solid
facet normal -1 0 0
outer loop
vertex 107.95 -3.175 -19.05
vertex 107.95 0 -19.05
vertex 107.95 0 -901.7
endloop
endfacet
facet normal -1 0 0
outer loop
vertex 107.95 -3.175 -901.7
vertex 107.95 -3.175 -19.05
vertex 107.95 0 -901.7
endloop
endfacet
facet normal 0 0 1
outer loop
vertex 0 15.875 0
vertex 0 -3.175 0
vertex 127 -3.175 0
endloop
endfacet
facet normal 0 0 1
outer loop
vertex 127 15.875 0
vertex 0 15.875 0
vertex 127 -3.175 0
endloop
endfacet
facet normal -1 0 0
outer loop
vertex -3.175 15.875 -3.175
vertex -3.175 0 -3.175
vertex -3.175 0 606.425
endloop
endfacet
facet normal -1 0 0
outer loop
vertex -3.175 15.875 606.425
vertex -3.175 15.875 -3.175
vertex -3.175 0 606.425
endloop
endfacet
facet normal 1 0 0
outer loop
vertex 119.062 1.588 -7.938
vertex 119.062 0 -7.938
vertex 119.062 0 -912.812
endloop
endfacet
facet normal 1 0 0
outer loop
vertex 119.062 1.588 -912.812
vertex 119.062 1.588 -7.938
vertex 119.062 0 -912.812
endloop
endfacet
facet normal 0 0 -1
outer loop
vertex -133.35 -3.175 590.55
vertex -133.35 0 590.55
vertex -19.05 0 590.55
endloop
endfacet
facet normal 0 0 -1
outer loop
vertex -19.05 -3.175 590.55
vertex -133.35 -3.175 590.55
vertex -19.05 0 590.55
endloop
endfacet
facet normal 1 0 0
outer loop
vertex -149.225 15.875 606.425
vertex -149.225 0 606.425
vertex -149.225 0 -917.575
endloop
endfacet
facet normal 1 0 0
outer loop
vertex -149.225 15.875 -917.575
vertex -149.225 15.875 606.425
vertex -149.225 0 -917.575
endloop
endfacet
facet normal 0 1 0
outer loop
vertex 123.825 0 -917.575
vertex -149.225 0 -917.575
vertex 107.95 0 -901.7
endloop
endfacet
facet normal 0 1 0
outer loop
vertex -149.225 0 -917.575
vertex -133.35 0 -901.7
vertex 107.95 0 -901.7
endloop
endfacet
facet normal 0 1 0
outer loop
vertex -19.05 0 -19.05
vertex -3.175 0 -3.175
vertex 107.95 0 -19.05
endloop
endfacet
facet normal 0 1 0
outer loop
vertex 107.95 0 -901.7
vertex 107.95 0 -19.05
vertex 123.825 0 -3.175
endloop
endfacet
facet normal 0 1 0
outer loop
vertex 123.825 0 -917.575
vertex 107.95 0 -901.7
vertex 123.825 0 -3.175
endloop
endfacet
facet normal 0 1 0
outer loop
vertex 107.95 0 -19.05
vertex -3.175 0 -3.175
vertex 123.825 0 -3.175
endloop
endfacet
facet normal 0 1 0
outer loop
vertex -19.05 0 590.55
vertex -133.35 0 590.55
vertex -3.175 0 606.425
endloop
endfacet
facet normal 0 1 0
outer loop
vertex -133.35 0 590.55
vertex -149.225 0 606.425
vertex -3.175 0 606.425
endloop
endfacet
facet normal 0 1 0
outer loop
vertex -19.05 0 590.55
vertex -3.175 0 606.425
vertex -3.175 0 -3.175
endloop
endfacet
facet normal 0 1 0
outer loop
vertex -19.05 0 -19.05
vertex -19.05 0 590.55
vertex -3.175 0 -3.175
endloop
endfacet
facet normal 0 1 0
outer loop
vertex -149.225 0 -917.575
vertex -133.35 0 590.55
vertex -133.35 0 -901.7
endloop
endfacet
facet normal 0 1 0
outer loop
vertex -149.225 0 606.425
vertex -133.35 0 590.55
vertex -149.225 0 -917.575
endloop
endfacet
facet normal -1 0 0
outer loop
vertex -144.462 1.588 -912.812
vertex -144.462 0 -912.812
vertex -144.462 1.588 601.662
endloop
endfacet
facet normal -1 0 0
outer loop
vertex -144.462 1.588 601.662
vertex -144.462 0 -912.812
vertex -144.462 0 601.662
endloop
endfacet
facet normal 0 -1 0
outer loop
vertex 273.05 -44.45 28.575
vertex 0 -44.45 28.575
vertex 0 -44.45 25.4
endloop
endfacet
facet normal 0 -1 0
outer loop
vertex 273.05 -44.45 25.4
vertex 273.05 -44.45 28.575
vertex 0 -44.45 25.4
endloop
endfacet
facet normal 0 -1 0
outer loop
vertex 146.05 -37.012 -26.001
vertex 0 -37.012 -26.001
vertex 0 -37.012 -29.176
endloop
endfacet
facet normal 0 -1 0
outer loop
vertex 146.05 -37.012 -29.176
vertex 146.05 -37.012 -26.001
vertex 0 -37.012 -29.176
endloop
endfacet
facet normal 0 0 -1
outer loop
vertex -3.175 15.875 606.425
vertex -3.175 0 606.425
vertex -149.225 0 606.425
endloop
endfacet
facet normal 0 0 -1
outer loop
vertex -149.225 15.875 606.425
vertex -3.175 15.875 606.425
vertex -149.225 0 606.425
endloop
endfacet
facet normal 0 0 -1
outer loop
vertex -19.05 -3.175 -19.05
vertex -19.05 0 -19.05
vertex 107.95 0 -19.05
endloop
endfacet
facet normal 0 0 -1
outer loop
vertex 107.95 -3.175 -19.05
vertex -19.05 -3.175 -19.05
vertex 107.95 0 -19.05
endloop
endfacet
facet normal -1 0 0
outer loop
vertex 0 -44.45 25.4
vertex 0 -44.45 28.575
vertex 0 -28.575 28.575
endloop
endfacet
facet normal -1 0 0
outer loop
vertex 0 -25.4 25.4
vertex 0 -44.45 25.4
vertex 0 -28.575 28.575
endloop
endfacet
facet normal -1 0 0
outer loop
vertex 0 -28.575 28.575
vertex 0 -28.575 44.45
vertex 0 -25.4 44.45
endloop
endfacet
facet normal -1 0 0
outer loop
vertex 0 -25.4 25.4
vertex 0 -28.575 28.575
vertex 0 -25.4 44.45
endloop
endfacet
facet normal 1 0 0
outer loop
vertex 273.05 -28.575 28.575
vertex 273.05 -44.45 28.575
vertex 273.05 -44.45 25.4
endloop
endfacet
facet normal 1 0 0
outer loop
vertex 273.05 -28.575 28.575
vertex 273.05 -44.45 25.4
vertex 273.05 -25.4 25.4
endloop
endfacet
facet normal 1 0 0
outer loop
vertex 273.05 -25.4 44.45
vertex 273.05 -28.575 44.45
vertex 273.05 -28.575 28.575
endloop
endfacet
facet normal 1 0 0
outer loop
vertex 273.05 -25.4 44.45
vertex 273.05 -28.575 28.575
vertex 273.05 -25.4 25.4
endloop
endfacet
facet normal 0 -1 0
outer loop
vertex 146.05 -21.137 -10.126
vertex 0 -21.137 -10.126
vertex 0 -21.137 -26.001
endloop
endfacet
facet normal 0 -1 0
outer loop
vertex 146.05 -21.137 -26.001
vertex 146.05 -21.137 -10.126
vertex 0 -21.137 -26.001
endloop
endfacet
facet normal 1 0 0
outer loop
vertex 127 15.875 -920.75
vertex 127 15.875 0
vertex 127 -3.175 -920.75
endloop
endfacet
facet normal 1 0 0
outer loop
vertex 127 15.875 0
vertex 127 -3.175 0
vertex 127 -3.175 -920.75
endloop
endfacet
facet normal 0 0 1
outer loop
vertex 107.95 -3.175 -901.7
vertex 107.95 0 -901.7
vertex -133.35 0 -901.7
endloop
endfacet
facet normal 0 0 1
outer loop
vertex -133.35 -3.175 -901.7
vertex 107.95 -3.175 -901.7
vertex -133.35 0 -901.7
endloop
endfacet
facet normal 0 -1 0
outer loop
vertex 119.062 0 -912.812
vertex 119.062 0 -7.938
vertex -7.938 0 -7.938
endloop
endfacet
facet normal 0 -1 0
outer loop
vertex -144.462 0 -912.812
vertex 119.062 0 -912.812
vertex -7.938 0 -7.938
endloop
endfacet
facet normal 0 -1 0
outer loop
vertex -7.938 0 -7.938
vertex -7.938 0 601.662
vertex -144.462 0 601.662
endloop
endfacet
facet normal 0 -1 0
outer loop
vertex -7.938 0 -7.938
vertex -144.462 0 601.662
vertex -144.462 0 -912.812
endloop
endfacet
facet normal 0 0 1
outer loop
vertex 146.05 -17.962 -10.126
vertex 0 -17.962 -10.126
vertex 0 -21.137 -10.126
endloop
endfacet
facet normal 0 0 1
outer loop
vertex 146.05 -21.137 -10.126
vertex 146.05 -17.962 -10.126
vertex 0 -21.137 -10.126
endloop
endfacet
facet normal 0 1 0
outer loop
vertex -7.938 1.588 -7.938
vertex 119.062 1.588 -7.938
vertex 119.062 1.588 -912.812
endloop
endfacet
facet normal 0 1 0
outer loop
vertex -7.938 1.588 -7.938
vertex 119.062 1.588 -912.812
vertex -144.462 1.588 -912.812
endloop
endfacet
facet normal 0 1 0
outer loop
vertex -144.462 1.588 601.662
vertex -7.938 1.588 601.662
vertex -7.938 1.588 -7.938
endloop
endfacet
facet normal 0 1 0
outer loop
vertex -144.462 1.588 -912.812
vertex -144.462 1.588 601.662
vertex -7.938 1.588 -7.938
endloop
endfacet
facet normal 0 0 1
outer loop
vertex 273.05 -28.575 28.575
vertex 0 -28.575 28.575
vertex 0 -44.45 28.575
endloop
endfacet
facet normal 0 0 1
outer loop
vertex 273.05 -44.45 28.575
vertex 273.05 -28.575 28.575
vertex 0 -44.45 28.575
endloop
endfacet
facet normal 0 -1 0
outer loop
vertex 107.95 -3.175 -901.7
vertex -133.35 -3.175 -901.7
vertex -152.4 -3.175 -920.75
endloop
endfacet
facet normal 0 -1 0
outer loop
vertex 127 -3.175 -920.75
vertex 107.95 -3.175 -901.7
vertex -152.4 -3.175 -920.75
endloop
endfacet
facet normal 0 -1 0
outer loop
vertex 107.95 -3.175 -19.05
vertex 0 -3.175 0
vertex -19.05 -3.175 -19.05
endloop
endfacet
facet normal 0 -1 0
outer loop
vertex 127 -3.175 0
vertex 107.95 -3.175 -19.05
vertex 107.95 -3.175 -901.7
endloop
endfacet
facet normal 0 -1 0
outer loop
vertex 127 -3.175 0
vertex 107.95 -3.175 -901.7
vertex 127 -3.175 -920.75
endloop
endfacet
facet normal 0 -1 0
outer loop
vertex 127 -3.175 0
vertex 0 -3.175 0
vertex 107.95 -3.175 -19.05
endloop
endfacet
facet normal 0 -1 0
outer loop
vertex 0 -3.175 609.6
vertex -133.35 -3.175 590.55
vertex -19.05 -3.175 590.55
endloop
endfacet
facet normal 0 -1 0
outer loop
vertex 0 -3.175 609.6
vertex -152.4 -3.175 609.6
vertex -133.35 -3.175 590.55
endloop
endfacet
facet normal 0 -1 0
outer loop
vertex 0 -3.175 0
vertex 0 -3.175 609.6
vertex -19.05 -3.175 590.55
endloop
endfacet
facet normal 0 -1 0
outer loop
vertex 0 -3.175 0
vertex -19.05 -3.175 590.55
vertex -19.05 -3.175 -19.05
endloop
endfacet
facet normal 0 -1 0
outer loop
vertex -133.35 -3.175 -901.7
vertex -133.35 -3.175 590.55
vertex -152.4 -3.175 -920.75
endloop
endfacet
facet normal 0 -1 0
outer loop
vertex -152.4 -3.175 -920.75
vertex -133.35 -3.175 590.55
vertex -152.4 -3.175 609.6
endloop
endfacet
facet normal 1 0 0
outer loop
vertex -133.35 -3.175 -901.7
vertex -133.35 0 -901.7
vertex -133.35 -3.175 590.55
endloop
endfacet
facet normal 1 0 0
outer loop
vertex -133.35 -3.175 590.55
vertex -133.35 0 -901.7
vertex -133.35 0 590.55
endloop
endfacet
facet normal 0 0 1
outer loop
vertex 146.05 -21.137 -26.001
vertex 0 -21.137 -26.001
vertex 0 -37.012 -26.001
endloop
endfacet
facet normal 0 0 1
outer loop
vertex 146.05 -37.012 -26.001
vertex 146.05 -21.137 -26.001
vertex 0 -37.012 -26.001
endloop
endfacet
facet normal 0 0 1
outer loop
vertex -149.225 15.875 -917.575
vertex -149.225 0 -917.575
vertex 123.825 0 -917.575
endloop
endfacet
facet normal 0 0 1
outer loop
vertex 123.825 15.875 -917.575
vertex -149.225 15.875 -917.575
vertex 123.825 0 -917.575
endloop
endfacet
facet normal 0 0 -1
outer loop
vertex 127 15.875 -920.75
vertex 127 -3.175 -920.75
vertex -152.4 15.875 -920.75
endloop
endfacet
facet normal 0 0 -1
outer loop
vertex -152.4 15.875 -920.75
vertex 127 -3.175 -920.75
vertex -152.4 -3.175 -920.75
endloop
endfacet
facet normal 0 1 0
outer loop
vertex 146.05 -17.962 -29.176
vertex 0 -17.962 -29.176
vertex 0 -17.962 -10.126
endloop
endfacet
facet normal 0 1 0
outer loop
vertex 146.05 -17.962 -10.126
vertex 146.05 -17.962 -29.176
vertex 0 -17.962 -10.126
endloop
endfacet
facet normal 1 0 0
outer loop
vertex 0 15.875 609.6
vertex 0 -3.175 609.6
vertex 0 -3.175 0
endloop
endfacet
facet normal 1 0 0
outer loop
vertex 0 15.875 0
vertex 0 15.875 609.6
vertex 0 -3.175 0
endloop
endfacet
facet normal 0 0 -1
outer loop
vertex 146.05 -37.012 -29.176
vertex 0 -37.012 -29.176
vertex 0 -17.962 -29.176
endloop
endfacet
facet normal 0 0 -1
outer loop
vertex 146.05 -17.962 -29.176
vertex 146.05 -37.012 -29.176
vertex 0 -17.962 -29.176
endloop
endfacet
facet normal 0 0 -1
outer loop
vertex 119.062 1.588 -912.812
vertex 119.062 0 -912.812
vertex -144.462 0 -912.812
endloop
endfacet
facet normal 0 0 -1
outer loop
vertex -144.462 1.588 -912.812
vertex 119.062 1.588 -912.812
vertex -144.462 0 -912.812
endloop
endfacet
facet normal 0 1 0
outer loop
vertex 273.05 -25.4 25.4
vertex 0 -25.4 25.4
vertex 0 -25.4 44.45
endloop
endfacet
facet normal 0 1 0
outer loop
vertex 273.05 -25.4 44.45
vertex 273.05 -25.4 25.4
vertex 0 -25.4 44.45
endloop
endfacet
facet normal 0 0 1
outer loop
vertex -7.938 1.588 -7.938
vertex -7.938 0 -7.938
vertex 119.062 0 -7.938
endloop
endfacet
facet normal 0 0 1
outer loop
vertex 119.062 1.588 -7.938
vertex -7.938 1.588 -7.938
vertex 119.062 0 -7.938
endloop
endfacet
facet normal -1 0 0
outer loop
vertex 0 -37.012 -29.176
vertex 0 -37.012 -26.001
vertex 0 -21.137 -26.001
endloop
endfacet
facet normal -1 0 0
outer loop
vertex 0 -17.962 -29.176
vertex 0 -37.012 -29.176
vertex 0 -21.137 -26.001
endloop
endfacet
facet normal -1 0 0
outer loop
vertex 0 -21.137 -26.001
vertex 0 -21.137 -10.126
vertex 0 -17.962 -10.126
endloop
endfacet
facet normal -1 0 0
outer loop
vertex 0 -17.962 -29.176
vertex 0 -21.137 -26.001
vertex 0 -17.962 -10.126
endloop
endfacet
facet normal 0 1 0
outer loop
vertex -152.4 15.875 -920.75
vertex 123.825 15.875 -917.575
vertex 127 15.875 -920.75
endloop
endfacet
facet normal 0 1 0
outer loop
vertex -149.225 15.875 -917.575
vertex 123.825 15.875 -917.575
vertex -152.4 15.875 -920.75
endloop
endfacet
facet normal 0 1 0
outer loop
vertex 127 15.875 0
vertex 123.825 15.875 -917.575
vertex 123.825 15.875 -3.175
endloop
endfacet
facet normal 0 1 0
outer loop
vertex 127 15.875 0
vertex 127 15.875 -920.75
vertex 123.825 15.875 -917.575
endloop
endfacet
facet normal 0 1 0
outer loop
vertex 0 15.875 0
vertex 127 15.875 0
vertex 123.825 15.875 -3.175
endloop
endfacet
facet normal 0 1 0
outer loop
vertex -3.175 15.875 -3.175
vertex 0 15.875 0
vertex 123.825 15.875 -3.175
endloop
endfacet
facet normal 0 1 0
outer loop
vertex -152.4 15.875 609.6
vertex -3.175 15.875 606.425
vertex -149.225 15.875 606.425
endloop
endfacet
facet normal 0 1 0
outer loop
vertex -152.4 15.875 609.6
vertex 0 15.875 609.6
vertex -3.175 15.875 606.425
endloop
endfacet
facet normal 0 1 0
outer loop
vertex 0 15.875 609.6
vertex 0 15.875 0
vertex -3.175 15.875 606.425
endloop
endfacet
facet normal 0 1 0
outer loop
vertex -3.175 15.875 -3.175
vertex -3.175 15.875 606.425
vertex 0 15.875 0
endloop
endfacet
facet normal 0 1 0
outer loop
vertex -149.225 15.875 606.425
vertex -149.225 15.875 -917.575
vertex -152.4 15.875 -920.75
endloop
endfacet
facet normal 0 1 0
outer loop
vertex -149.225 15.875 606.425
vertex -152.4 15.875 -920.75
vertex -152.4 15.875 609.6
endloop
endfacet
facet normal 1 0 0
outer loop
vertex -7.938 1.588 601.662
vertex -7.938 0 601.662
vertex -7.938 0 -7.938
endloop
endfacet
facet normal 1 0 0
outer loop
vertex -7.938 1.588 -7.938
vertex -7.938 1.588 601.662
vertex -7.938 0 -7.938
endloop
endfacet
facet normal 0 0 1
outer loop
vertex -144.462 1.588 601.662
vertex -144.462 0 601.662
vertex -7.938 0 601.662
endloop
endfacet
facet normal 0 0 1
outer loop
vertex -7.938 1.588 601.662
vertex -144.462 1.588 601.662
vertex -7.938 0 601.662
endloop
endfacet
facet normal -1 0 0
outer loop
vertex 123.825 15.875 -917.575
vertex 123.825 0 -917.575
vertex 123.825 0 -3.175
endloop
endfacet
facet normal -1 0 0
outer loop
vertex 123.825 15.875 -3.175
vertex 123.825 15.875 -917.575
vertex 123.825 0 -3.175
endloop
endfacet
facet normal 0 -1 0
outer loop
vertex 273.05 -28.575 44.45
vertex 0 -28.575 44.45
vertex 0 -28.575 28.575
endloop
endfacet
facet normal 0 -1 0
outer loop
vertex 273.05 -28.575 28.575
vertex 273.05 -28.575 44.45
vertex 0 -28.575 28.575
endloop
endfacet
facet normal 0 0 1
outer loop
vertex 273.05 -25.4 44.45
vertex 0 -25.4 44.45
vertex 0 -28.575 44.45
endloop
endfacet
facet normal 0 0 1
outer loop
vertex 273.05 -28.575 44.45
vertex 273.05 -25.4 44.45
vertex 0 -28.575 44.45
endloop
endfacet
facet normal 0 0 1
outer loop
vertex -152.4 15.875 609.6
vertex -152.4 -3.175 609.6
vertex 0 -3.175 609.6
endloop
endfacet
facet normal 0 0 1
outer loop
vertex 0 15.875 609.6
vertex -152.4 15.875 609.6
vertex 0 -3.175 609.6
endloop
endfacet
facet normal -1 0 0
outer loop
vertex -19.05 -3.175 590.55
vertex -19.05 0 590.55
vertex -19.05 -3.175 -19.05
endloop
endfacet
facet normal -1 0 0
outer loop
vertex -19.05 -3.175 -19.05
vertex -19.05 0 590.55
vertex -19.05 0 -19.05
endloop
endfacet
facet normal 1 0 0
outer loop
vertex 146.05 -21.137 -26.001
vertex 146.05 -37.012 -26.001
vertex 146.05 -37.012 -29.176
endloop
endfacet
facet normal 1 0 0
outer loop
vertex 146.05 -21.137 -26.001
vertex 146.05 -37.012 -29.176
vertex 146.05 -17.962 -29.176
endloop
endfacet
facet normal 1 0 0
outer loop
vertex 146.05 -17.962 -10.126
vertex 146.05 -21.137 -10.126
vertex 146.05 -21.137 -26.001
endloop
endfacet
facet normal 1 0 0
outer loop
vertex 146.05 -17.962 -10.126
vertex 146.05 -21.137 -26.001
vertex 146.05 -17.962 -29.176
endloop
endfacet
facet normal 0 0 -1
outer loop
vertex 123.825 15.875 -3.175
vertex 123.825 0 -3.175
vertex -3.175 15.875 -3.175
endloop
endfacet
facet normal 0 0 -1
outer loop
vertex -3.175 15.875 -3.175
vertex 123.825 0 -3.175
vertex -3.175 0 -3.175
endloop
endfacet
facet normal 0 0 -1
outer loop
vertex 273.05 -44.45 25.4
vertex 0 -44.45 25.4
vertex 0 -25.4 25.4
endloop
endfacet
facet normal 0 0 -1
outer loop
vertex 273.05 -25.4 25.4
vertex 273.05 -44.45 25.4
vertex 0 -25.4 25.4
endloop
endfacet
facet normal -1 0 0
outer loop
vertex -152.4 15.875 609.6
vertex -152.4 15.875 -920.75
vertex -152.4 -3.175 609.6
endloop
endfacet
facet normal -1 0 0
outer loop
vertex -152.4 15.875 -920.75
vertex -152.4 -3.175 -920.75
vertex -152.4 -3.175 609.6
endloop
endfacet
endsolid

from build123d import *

# Parameters (mm, degrees)
F1_DEPTH = 3.175
F3_DEPTH = 15.875
F5_DEPTH = 273.05
F7_DEPTH = 146.05
F9_DEPTH = 1.5875


with BuildPart() as f1:
    # F0 (on Front) → F1 (new body)
    with BuildSketch(Plane.XZ):
        Polygon((0, 0), (0, 609.6), (-152.4, 609.6), (-152.4, -920.75), (127, -920.75), (127, 0), align=None)
        Polygon((-133.35, 590.55), (-19.05, 590.55), (-19.05, -19.05), (107.95, -19.05), (107.95, -901.7), (-133.35, -901.7), align=None, mode=Mode.SUBTRACT)
    extrude(amount=F1_DEPTH)

    # F2 (on face) → F3 (join)
    with BuildSketch(Plane(origin=(0, 0, 0), x_dir=(-1, 0, 0), z_dir=(0, 1, 0))):
        Polygon((0, 0), (-127, 0), (-127, -920.75), (152.4, -920.75), (152.4, 609.6), (0, 609.6), align=None)
        Polygon((-123.825, -917.575), (-123.825, -3.175), (3.175, -3.175), (3.175, 606.425), (149.225, 606.425), (149.225, -917.575), align=None, mode=Mode.SUBTRACT)
    extrude(amount=F3_DEPTH)


with BuildPart() as f5:
    # F4 (on Right) → F5 (new body)
    with BuildSketch(Plane.YZ):
        Polygon((-25.4, 25.4), (-25.4, 44.45), (-28.575, 44.45), (-28.575, 28.575), (-44.45, 28.575), (-44.45, 25.4), align=None)
    extrude(amount=F5_DEPTH)


with BuildPart() as f7:
    # F6 (on Right) → F7 (new body)
    with BuildSketch(Plane.YZ):
        Polygon((-17.96168, -29.175504), (-17.96168, -10.125504), (-21.13668, -10.125504), (-21.13668, -26.000504), (-37.01168, -26.000504), (-37.01168, -29.175504), align=None)
    extrude(amount=F7_DEPTH)


with BuildPart() as f9:
    # F8 (on face) → F9 (new body)
    with BuildSketch(Plane(origin=(0, 0, 0), x_dir=(-1, 0, 0), z_dir=(0, 1, 0))):
        Polygon((7.9375, 601.6625), (7.9375, -7.9375), (-119.0625, -7.9375), (-119.0625, -912.8125), (144.4625, -912.8125), (144.4625, 601.6625), align=None)
        Polygon((19.05, -19.05), (19.05, 590.55), (133.35, 590.55), (133.35, -901.7), (-107.95, -901.7), (-107.95, -19.05), align=None, mode=Mode.SUBTRACT)
        Polygon((133.35, 590.55), (19.05, 590.55), (19.05, -19.05), (-107.95, -19.05), (-107.95, -901.7), (133.35, -901.7), align=None)
    extrude(amount=F9_DEPTH)


solid = Compound([f1.part, f5.part, f7.part, f9.part])
